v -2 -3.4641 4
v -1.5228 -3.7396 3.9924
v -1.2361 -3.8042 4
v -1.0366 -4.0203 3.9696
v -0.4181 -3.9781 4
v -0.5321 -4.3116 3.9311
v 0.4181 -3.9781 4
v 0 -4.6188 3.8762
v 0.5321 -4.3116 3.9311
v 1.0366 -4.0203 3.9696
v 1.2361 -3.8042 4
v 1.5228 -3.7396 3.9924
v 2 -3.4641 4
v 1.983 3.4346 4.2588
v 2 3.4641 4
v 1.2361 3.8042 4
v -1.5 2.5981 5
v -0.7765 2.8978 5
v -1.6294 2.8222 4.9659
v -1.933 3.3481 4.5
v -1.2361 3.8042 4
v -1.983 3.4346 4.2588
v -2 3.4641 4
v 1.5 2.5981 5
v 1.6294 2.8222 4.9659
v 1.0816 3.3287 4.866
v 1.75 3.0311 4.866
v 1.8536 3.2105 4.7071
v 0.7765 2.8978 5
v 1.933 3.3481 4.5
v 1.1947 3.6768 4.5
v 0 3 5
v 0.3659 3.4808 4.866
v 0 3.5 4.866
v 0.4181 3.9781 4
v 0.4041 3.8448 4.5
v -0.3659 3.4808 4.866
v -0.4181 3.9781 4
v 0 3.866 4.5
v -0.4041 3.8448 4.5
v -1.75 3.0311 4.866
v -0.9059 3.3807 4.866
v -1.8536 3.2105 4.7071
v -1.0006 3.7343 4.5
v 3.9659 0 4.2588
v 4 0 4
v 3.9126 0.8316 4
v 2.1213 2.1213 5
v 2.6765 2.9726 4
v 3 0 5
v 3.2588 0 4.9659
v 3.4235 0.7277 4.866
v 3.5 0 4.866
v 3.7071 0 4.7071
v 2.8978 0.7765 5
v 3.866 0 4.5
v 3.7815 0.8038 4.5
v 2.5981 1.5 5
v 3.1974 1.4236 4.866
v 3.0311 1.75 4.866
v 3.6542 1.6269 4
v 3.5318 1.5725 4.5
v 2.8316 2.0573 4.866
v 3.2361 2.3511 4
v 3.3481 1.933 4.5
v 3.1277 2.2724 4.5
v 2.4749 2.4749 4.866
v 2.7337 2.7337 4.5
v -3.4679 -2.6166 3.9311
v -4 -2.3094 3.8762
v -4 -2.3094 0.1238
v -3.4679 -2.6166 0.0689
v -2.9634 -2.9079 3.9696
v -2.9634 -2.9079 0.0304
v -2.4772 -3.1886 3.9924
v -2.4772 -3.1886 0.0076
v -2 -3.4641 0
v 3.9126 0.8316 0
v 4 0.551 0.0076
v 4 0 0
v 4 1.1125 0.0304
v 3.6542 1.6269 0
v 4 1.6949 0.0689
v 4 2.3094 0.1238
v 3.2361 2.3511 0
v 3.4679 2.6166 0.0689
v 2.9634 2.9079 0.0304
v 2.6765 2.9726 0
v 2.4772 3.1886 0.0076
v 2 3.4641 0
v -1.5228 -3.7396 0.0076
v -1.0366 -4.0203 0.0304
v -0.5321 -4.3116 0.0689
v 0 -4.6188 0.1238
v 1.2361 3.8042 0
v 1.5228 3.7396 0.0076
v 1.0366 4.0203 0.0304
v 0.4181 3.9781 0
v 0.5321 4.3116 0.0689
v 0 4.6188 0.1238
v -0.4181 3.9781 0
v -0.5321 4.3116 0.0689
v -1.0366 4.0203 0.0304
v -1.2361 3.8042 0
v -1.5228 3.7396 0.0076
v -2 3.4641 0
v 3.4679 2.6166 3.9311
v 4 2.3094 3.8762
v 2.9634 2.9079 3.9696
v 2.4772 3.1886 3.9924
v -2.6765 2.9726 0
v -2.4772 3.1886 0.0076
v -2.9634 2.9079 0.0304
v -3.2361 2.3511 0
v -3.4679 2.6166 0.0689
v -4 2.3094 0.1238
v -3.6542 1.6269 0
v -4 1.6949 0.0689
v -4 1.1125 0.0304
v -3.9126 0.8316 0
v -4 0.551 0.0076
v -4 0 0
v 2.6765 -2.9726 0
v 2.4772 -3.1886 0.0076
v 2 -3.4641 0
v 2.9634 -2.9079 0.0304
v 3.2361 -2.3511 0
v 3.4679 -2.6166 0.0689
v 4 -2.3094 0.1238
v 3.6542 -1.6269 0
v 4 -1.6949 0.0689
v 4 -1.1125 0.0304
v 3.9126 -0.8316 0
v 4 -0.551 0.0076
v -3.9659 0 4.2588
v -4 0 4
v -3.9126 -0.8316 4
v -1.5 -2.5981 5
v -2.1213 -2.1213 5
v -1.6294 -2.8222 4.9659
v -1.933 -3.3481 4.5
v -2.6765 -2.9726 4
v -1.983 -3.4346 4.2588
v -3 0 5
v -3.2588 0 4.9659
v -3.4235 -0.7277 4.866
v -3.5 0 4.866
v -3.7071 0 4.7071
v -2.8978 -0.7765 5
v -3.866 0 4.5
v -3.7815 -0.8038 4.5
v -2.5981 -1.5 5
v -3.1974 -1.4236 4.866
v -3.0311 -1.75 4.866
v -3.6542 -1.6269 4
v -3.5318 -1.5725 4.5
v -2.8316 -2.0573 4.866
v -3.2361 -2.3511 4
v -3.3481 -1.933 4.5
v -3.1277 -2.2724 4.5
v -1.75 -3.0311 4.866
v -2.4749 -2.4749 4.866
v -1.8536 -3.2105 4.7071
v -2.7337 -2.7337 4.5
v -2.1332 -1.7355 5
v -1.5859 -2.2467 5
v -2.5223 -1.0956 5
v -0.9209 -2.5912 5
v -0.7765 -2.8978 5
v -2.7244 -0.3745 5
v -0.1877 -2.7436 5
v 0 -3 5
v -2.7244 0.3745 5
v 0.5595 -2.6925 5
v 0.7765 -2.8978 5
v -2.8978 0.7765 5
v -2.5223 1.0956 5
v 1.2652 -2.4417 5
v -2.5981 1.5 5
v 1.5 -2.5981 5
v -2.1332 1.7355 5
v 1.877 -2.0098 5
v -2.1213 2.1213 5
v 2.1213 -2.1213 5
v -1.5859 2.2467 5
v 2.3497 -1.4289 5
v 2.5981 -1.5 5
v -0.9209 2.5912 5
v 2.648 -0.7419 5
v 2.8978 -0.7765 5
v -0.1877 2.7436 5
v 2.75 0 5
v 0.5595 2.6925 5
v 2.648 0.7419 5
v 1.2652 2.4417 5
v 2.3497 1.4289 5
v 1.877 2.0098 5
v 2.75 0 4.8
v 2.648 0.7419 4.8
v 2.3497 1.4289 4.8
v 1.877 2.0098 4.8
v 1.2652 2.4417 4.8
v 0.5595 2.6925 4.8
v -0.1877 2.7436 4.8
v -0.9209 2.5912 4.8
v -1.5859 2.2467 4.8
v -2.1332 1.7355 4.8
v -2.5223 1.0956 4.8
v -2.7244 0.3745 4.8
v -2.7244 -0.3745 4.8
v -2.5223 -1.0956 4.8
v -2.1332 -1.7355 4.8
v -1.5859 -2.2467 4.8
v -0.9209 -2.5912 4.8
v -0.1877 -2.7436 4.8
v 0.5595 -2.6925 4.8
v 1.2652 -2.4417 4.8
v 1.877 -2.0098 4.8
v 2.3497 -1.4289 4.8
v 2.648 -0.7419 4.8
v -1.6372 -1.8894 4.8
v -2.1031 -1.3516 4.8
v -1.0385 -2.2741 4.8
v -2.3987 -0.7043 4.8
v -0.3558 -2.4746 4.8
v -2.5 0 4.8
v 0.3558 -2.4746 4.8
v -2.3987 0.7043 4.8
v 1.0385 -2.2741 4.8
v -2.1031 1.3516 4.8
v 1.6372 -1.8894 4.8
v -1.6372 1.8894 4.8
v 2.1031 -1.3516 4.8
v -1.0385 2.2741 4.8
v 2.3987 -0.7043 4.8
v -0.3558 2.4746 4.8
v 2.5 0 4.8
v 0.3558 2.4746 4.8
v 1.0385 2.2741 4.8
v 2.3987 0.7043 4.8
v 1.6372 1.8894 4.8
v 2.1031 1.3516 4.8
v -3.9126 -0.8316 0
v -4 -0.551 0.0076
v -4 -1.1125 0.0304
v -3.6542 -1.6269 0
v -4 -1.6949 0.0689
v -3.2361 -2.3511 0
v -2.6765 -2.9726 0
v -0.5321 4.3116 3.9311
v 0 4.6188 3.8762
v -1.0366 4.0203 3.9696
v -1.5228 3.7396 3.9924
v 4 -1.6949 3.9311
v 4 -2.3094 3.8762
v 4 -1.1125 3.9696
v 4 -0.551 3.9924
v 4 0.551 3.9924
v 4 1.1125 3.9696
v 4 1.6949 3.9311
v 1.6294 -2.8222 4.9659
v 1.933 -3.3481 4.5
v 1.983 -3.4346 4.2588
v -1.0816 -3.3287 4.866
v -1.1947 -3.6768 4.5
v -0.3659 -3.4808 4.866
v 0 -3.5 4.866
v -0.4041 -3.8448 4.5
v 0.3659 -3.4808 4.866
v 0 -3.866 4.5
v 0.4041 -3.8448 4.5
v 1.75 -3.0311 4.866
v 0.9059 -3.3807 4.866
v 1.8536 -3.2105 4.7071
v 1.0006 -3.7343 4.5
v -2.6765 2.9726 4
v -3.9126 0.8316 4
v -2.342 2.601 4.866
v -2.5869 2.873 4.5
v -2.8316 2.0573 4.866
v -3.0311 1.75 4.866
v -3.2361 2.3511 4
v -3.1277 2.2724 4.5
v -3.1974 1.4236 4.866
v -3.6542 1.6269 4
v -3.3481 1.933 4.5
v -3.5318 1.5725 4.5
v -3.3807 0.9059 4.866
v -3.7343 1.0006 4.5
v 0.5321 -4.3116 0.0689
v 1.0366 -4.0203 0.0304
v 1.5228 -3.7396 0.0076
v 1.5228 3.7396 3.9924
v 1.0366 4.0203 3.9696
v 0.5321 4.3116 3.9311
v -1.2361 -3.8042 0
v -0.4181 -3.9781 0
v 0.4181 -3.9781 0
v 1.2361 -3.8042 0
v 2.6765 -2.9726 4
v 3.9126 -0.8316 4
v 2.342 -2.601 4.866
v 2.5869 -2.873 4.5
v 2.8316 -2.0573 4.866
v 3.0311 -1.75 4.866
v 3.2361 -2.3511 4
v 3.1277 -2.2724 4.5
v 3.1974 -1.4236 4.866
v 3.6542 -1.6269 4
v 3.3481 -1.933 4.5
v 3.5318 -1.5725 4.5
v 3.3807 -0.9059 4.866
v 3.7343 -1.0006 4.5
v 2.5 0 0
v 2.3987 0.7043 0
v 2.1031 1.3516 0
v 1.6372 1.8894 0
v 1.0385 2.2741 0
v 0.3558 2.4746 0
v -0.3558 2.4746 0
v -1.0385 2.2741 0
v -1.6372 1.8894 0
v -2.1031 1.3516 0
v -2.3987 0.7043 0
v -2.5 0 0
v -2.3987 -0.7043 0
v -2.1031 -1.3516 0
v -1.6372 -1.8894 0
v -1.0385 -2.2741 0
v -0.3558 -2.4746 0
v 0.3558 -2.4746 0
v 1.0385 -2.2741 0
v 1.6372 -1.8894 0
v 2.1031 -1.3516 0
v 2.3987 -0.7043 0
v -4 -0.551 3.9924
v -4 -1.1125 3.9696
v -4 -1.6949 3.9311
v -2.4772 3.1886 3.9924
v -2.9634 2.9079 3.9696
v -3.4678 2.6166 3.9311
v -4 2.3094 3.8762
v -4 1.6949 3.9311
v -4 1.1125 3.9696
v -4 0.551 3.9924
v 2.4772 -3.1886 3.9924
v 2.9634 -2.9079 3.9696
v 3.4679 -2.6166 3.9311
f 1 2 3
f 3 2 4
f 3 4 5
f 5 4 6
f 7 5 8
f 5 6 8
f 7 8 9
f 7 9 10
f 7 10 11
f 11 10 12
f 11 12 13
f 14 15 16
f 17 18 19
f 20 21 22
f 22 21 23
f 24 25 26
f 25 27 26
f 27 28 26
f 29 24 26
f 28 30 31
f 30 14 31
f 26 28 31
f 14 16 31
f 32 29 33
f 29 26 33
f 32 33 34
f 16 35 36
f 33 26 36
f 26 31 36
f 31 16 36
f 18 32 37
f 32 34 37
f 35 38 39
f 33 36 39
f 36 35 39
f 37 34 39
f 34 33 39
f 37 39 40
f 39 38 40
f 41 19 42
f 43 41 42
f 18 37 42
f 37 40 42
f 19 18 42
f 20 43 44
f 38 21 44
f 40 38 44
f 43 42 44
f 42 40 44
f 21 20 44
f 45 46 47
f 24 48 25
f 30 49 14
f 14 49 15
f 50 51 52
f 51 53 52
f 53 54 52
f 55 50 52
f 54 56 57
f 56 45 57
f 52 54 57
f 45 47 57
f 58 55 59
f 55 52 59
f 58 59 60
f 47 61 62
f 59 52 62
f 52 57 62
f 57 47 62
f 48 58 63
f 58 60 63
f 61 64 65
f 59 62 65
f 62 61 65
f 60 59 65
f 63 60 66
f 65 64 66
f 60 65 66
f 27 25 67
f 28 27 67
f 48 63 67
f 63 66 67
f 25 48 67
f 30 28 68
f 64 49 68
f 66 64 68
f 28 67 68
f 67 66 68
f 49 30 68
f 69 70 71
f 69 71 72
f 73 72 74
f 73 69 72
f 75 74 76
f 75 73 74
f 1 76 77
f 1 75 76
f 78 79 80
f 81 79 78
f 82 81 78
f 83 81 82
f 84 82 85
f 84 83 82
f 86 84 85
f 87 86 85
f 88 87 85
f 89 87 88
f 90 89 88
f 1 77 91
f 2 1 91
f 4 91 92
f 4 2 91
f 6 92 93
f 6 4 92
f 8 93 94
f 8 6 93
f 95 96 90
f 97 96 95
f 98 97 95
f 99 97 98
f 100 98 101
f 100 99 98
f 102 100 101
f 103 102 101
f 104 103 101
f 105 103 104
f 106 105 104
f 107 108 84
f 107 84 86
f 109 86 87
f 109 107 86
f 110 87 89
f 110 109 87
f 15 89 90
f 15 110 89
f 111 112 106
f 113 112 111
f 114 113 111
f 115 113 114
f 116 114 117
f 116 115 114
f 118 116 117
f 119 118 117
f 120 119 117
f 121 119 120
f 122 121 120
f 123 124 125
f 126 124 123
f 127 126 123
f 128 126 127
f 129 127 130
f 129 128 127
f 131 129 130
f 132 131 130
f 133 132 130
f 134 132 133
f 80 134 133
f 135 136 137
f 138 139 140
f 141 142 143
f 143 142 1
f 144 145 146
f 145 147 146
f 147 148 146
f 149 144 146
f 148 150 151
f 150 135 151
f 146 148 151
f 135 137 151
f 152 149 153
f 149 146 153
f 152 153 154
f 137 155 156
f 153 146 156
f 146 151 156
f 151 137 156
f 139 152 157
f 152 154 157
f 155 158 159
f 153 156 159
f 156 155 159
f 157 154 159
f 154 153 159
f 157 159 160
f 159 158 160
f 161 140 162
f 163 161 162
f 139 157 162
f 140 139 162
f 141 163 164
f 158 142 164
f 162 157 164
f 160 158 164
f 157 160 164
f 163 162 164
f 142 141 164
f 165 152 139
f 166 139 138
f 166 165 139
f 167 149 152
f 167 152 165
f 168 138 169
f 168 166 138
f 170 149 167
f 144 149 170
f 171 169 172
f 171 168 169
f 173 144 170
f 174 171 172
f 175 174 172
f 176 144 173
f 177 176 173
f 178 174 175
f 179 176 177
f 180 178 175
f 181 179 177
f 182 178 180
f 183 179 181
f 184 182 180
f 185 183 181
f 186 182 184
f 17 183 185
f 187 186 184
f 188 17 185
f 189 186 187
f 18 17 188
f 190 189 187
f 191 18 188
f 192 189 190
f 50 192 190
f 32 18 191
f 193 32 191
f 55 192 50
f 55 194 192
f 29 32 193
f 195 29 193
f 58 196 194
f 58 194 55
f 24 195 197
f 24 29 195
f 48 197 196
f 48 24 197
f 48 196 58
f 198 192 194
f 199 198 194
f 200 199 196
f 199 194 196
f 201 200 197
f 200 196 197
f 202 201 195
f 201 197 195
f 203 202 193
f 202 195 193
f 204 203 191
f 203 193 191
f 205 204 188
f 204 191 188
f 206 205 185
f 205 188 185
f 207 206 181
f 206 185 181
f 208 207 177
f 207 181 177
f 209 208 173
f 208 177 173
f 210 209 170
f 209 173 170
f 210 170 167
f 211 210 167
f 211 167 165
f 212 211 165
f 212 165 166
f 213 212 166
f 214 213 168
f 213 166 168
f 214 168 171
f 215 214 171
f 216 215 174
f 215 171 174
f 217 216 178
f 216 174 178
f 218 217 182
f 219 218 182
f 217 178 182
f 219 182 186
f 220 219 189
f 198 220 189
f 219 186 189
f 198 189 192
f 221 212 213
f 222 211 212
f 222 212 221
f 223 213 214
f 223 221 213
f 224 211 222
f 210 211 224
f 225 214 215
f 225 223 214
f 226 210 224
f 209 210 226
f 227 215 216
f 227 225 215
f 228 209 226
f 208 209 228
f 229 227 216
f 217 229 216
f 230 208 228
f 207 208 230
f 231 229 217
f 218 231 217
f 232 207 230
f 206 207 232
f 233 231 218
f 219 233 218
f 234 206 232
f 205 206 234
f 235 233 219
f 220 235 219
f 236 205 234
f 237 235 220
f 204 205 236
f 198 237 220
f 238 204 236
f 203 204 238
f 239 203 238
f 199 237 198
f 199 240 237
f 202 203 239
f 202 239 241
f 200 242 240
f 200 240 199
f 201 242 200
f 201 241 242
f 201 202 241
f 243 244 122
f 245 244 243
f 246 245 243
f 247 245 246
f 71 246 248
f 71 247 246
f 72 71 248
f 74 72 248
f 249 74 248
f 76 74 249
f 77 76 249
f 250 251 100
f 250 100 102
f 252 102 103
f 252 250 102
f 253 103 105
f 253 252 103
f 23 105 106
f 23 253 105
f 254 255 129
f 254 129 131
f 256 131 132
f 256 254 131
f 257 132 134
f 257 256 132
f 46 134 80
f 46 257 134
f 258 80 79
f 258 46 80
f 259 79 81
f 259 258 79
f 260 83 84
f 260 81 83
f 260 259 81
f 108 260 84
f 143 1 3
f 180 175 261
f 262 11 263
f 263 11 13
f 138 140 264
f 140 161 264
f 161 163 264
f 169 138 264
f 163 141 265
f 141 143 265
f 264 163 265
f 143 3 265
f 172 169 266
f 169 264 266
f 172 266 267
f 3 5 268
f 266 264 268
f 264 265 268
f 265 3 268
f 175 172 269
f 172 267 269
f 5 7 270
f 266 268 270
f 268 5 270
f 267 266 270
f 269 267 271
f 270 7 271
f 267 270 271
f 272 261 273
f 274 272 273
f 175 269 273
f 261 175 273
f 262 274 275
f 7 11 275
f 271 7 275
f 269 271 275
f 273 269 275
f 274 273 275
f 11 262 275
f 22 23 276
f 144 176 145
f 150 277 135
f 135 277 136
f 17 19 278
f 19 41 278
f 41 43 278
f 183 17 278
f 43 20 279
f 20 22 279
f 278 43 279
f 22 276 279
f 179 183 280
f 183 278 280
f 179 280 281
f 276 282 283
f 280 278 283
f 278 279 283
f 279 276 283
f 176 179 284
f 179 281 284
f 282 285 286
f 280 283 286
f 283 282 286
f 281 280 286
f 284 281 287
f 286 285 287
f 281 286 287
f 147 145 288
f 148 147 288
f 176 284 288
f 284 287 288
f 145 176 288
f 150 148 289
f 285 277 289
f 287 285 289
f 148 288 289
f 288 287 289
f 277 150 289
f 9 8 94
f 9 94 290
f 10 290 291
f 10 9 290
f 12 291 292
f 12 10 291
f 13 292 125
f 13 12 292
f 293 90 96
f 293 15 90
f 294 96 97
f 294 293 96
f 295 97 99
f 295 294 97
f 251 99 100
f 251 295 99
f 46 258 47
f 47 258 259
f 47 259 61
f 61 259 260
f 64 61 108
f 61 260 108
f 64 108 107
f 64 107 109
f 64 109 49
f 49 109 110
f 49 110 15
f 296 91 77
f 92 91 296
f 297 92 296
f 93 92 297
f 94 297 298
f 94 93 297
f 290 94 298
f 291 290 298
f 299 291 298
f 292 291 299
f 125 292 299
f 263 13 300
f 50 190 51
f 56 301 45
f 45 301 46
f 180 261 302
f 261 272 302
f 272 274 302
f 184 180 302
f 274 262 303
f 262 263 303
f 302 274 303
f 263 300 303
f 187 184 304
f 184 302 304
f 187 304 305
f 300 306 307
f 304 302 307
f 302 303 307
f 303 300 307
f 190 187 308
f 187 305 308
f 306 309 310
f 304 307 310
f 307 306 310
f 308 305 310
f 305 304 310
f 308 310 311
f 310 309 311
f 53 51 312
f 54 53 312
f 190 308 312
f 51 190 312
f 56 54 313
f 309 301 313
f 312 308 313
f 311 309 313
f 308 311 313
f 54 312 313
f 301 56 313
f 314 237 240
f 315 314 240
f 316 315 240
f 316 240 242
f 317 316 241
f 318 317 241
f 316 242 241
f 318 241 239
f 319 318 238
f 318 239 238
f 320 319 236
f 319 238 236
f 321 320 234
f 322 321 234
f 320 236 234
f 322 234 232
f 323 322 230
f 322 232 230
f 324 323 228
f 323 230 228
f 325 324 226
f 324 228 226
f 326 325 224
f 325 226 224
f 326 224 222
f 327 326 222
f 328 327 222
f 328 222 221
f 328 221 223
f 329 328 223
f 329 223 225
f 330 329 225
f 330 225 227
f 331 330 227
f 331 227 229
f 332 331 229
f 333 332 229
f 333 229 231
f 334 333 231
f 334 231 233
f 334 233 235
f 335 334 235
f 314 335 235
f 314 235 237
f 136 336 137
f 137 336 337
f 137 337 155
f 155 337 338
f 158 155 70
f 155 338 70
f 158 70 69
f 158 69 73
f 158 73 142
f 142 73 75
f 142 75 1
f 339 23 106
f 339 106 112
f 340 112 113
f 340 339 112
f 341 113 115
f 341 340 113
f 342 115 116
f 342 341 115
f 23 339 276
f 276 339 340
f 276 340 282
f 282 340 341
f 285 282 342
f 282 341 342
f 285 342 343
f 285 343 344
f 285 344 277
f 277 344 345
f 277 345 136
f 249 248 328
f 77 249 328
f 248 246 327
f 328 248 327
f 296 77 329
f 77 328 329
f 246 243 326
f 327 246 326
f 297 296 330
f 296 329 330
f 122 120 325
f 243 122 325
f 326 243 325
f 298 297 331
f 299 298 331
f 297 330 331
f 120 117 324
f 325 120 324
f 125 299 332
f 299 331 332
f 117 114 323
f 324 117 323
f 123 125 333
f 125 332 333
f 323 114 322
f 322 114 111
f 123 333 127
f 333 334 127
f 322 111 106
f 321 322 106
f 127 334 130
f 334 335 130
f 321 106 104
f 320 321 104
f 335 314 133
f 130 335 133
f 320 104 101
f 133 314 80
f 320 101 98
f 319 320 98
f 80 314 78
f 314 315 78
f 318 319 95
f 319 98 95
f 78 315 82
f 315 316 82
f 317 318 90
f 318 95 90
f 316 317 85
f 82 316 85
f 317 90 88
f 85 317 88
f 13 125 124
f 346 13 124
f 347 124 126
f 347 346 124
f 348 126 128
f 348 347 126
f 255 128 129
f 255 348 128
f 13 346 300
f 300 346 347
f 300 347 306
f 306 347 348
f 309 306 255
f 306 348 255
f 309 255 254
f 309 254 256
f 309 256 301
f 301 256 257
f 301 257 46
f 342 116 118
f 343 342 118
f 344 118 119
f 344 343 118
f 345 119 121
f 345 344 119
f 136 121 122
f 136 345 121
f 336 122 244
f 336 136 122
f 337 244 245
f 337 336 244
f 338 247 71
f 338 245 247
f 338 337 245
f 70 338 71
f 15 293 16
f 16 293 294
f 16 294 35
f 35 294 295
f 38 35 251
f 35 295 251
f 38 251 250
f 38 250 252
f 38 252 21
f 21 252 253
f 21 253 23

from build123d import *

# Parameters (mm, degrees)
F0_R       = 6
F1_DEPTH   = 4
F2_SIZE2   = 0.4
F2_SIZE    = 2
F2_2_SIZE2 = 0.4
F2_2_SIZE  = 2
F4_DEPTH   = 25
F6_DEPTH   = 1
F7_R       = 0.99999
F8_R       = 2.75
F9_DEPTH   = 0.2
F10_R      = 2.5
F11_DEPTH  = 25


# Not quite as in the source:
# - a fillet or chamfer is up to 0.001 mm smaller than in the source, because OpenCascade refuses the exact size


with BuildPart() as f1:
    # F0 (on Top) → F1 (new body)
    with BuildSketch(Plane.XY):
        Circle(F0_R)
    extrude(amount=F1_DEPTH)

    # F2
    f2_edges = [f1.edges().sort_by_distance(p)[0] for p in [
        (-6, 0, 4),
    ]]
    f2_side = f1.faces().sort_by_distance((0, 0, 4))[0]
    chamfer(f2_edges, length=F2_SIZE, length2=F2_SIZE2, reference=f2_side)

    # F2#2
    f2_2_edges = [f1.edges().sort_by_distance(p)[0] for p in [
        (-6, 0, 0),
    ]]
    f2_2_side = f1.faces().sort_by_distance((0, 0, 0))[0]
    chamfer(f2_2_edges, length=F2_2_SIZE, length2=F2_2_SIZE2, reference=f2_2_side)

    # F3 (on face) → F4 (intersect)
    with BuildSketch(Plane.XY.offset(4)):
        with BuildLine():
            Line((-4, -2.3094010768), (-1.9999999977, -3.4641016165))
            ThreePointArc((-1.9999999977, -3.4641016165), (-3.4641016145, -2.0000000012), (-4, 0))
            Line((-4, 0), (-4, -2.3094010768))
        make_face()
        with BuildLine():
            ThreePointArc((-4, 0), (-3.4641016358, 1.9999999642), (-2.0000000715, 3.4641015738))
            Line((-2.0000000715, 3.4641015738), (-4, 2.3094010768))
            Line((-4, 2.3094010768), (-4, 0))
        make_face()
        with BuildLine():
            ThreePointArc((-2.0000000715, 3.4641015738), (-2.18e-08, 4), (2.0000000338, 3.4641015956))
            Line((2.0000000338, 3.4641015956), (0, 4.6188021535))
            Line((0, 4.6188021535), (-2.0000000715, 3.4641015738))
        make_face()
        with BuildLine():
            Line((4, 0), (4, 2.3094010768))
            Line((4, 2.3094010768), (2.0000000338, 3.4641015956))
            ThreePointArc((2.0000000338, 3.4641015956), (3.4641016249, 1.9999999831), (4, 0))
        make_face()
        with BuildLine():
            Line((4, -2.3094010768), (4, 0))
            ThreePointArc((4, 0), (3.4641016169, -1.9999999969), (2.0000000062, -3.4641016116))
            Line((2.0000000062, -3.4641016116), (4, -2.3094010768))
        make_face()
        with BuildLine():
            Line((0, -4.6188021535), (2.0000000062, -3.4641016116))
            ThreePointArc((2.0000000062, -3.4641016116), (4.9e-09, -4), (-1.9999999977, -3.4641016165))
            Line((-1.9999999977, -3.4641016165), (0, -4.6188021535))
        make_face()
        with BuildLine():
            ThreePointArc((2.0000000062, -3.4641016116), (3.4641016169, -1.9999999969), (4, 0))
            ThreePointArc((4, 0), (3.4641016249, 1.9999999831), (2.0000000338, 3.4641015956))
            ThreePointArc((2.0000000338, 3.4641015956), (-2.18e-08, 4), (-2.0000000715, 3.4641015738))
            ThreePointArc((-2.0000000715, 3.4641015738), (-3.4641016358, 1.9999999642), (-4, 0))
            ThreePointArc((-4, 0), (-3.4641016145, -2.0000000012), (-1.9999999977, -3.4641016165))
            ThreePointArc((-1.9999999977, -3.4641016165), (4.9e-09, -4), (2.0000000062, -3.4641016116))
        make_face()
    extrude(amount=-F4_DEPTH, mode=Mode.INTERSECT)

    # F5 (on face) → F6 (join)
    with BuildSketch(Plane.XY.offset(4)):
        with BuildLine():
            ThreePointArc((1.9999999952, -3.4641016179), (3.4641016138, -2.0000000024), (4, 0))
            ThreePointArc((4, 0), (3.4641016188, 1.9999999936), (2.0000000128, 3.4641016077))
            ThreePointArc((2.0000000128, 3.4641016077), (0, 4), (-2.0000000128, 3.4641016077))
            ThreePointArc((-2.0000000128, 3.4641016077), (-3.4641016188, 1.9999999936), (-4, 0))
            ThreePointArc((-4, 0), (-3.4641016204, -1.9999999909), (-2.0000000181, -3.4641016047))
            ThreePointArc((-2.0000000181, -3.4641016047), (-1.32e-08, -4), (1.9999999952, -3.4641016179))
        make_face()
    extrude(amount=F6_DEPTH)

    # F7 (radius 1 in the source; OpenCascade refuses exactly that, so slightly less here)
    f7_edges = [f1.edges().sort_by_distance(p)[0] for p in [
        (-4, 0, 5),
    ]]
    fillet(f7_edges, radius=F7_R)

    # F8 (on face) → F9 (cut)
    with BuildSketch(Plane.XY.offset(5)):
        Circle(F8_R)
    extrude(amount=-F9_DEPTH, mode=Mode.SUBTRACT)

    # F10 (on face) → F11 (cut)
    with BuildSketch(Plane.XY.offset(4.8)):
        Circle(F10_R)
    extrude(amount=-F11_DEPTH, mode=Mode.SUBTRACT)


solid = f1.part
